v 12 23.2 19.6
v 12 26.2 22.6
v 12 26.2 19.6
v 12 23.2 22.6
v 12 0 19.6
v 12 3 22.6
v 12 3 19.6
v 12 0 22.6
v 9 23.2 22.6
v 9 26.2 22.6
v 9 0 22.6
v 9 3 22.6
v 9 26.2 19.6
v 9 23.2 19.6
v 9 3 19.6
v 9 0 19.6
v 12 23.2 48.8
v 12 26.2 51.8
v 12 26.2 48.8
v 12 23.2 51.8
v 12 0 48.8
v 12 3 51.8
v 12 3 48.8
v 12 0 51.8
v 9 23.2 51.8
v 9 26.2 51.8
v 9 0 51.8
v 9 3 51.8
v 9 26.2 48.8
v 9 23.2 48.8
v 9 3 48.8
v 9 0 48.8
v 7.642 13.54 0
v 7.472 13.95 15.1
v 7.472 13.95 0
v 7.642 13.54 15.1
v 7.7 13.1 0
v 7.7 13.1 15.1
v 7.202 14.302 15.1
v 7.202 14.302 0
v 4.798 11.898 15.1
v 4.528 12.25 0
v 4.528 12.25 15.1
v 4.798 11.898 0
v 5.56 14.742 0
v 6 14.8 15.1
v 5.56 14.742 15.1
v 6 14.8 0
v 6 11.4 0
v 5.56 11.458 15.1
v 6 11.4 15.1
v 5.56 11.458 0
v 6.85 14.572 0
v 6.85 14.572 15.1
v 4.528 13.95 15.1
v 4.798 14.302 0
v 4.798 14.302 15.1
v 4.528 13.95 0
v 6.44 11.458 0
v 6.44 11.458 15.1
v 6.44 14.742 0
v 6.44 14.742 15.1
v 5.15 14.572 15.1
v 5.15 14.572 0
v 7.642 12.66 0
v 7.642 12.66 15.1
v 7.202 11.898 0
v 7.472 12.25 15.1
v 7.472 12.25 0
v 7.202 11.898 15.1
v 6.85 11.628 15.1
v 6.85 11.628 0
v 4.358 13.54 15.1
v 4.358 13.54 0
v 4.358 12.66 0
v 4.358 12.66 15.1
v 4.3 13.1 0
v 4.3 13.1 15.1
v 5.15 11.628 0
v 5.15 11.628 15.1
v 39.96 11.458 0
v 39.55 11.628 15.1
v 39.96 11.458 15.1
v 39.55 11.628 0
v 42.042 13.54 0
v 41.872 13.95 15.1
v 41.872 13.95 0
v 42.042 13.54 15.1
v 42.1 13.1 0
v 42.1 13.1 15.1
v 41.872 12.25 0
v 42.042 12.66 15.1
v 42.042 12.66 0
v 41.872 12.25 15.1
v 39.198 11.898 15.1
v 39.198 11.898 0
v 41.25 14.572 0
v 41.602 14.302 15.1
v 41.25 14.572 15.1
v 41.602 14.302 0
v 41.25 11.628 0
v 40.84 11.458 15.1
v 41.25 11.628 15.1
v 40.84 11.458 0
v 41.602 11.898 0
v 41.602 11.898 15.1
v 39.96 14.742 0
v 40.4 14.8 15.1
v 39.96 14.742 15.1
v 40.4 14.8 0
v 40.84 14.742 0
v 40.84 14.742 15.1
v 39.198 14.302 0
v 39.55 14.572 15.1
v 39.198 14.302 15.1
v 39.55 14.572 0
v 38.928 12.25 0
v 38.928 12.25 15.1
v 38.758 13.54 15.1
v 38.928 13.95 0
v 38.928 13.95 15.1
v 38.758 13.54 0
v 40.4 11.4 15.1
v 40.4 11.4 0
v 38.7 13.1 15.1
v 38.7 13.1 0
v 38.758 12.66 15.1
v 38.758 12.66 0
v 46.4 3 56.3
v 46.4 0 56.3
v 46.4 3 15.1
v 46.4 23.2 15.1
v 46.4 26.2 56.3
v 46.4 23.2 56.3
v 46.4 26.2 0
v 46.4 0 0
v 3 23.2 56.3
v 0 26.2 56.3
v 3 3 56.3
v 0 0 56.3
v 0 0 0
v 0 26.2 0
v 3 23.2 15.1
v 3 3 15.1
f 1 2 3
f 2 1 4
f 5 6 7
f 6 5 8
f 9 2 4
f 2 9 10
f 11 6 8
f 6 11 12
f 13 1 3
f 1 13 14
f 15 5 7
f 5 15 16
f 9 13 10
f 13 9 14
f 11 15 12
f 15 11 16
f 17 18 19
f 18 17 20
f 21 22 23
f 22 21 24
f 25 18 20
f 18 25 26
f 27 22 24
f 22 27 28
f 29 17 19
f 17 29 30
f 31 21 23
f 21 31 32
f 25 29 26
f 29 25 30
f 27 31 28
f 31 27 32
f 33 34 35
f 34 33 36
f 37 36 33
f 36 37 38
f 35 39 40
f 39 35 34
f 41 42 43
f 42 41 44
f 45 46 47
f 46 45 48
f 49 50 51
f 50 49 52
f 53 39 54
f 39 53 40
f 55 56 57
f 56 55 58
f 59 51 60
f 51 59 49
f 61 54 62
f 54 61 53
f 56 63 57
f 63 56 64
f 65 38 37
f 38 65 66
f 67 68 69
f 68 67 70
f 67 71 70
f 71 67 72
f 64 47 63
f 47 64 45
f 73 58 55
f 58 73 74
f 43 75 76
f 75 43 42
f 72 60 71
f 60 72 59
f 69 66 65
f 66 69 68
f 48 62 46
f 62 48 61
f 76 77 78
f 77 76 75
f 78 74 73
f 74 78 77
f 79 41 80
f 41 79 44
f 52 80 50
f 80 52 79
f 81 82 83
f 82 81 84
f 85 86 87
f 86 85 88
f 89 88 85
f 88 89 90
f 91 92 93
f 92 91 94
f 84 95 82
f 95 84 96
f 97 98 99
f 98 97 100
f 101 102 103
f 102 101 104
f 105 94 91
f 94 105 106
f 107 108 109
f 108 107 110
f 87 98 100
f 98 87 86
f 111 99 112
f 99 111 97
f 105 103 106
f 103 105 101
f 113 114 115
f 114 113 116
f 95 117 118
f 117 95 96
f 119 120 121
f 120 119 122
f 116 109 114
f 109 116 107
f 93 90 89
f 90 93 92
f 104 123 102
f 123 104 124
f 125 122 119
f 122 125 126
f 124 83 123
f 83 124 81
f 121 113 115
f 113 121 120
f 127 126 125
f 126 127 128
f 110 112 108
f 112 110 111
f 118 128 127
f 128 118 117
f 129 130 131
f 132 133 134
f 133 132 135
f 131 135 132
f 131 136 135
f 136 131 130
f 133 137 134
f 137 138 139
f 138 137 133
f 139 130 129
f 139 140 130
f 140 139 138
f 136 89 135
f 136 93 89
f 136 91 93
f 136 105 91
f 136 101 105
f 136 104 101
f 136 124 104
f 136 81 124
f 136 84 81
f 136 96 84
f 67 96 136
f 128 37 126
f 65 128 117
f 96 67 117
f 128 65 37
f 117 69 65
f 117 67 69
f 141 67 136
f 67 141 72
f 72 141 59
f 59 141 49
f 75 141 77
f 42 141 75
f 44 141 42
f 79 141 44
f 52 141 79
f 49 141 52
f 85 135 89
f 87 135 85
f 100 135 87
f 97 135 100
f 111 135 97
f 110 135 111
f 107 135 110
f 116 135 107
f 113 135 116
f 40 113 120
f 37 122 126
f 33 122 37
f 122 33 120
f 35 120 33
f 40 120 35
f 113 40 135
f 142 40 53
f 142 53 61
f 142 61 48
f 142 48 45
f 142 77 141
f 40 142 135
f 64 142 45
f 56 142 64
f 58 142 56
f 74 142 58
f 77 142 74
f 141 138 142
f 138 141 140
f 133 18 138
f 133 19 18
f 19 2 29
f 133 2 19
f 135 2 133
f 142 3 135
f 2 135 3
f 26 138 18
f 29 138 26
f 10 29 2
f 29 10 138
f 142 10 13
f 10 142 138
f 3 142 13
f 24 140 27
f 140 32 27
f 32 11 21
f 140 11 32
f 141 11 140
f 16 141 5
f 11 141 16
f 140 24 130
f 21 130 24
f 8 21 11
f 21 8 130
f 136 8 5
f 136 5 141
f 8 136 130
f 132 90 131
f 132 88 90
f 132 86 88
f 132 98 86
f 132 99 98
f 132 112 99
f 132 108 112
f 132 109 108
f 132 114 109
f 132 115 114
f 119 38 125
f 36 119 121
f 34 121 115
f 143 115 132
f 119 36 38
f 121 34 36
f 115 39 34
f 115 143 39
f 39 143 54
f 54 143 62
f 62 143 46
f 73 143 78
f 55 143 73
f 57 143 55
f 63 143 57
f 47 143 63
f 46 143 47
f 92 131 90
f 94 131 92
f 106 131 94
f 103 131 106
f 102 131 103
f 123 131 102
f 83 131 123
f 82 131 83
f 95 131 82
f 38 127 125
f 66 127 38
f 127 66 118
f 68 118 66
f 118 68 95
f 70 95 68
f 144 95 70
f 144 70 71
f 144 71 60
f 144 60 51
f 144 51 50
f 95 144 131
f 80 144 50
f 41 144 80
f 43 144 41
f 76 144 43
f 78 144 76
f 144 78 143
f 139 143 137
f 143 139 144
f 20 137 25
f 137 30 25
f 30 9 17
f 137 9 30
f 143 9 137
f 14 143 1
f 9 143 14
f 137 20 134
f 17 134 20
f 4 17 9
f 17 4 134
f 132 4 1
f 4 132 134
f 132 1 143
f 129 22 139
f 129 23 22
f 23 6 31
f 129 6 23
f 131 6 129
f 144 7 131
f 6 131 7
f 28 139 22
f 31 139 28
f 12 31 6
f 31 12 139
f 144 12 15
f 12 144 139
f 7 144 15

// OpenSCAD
// file: params_v4.scad
// ============================================================
// params_v4.scad — print-in-place hinge, single continuous barrel
// Base + both flaps print together as ONE piece, flat/open (like
// the reference box), then fold closed by hand after printing.
// No rod, no pins, no hardware, no snap-assembly step.
// ============================================================
$fn = 64;

// ---- Bowl ----
BOWL_DIA      = 108;
BOWL_DEPTH    = 40;
BOWL_RADIUS   = BOWL_DIA / 2;

// ---- Base block ----
WALL          = 6;
FLOOR_T       = 4;
BASE_SIZE     = BOWL_DIA + 2 * WALL;     // 120mm square
BASE_HEIGHT   = BOWL_DEPTH + FLOOR_T;    // 44mm

// ---- Flap ----
FLAP_LEN      = BASE_SIZE;
FLAP_OVERLAP  = 4;
FLAP_DEPTH    = BASE_SIZE / 2 + FLAP_OVERLAP;
FLAP_T        = 3;

// ---- Print-in-place barrel hinge ----
PIN_D         = 8;                  // pin diameter
SOCKET_CLEAR  = 0.5;                // total diametral clearance (tune per printer/material)
SOCKET_ID     = PIN_D + SOCKET_CLEAR;
SOCKET_SHELL  = 3;
SOCKET_OD     = SOCKET_ID + 2 * SOCKET_SHELL;
END_MARGIN    = 4;                  // inset from each end of the edge
BARREL_LEN    = FLAP_LEN - 2 * END_MARGIN;   // socket length (both hinges)

// reinforcement ridge so the thin panel/base have enough material to embed the pin
PAD_DEPTH     = 10;
FLAP_PAD_H    = PIN_D + 2;
// HINGE_Z is set so the pin/socket genuinely overlaps into both the base
// block and the flap panel (a few mm of real volumetric overlap) rather
// than sitting exactly tangent to a flat face — exact tangency between
// separate solids is a classic non-manifold CSG trap.
HINGE_EMBED   = 2;  // how far the joint dips below the base's top surface
HINGE_Z       = BASE_HEIGHT + HINGE_EMBED;

// small relief gap so the flap panel doesn't touch the base along a bare
// edge (that kind of zero-area contact causes non-manifold CSG results,
// and physically the panel doesn't need to touch — only the pin/socket
// joint should connect the two pieces).
HINGE_GAP     = 0.4;
BASE_PAD_H    = (HINGE_Z - BASE_HEIGHT) + SOCKET_OD / 2 + 2;

// ---- Servo drive extension (flap's pin extends past the base to meet the horn) ----
SERVO_EXT_LEN = 22;                 // how far the pin extends past the base edge
SERVO_HORN_OD = 24;                 // verify with calipers
SERVO_HORN_BOLT_CIRCLE = 19;        // verify with calipers
SERVO_BOSS_D  = SERVO_HORN_OD + 4;
SERVO_BOSS_T  = 4;
M3_CLEAR      = 3.4;

// ---- MG996R servo body (for the separate bracket — still a physical part) ----
SERVO_W       = 40.7;
SERVO_D       = 19.7;
SERVO_H       = 42.9;
SERVO_SHAFT_OFFSET = 30.9;
// main file
// ============================================================
// 22_servo_mount_v2.scad — MG996R bracket, shaft aligned to rod
// The servo is rotated 90° from its usual orientation so the
// output shaft points sideways (along +X) into the rod/coupler,
// instead of the usual "shaft points up" mounting.
//
// Pocket is open on TOP (drop the servo in) and open on the
// FRONT/+X face (shaft + horn protrude toward the base). Servo
// is held with zip-tie slots rather than modeled ear-mount holes,
// since exact ear spacing varies by MG996R clone — verify yours
// with calipers; zip ties are forgiving of small errors for v1.
//
// Print orientation: as-is, flat on the bed.
// ============================================================
include <params_v4.scad>

WALL2   = 3;
TOL     = 0.5;   // pocket clearance around servo body

// after 90° remap: X-extent(depth into bracket)=SERVO_H, Y-extent=SERVO_D, Z-extent=SERVO_W
POCKET_X = SERVO_H + TOL;
POCKET_Y = SERVO_D + TOL;
POCKET_Z = SERVO_W + TOL;

// shaft sits 30.9mm up from the pocket's "bottom" (see params_v4 SERVO_SHAFT_OFFSET)
POCKET_BOTTOM_Z = HINGE_Z - SERVO_SHAFT_OFFSET;

BX = WALL2 + POCKET_X;              // back wall + pocket depth (front left open)
BY = POCKET_Y + 2 * WALL2;          // side walls both sides
BZ = POCKET_BOTTOM_Z + POCKET_Z;    // pedestal + pocket height (top left open)

module servo_pocket() {
    translate([WALL2, WALL2, POCKET_BOTTOM_Z])
        cube([POCKET_X + 5, POCKET_Y, POCKET_Z + 5]); // +5 extends through front & top (open)
}

module ziptie_slots() {
    // two slot pairs (through both side walls), one near pocket bottom, one near top
    for (z = [POCKET_BOTTOM_Z + 6, POCKET_BOTTOM_Z + POCKET_Z - 6]) {
        translate([WALL2 + 6, -1, z - 1.5])
            cube([3, BY + 2, 3]);
    }
}

module mount_holes() {
    // 2x M3 through the pedestal, for screwing bracket to a shared platform/board
    for (x = [6, BX - 6])
        translate([x, BY / 2, -0.1])
            cylinder(d = M3_CLEAR, h = POCKET_BOTTOM_Z + 0.2, $fn = 24);
}

module servo_bracket() {
    difference() {
        cube([BX, BY, BZ]);
        servo_pocket();
        ziptie_slots();
        mount_holes();
    }
}

servo_bracket();

// ---- reference: where the shaft/horn ends up in world coords (for the assembly) ----
echo("Servo shaft center (local bracket coords): X =", BX, " Y =", BY/2, " Z =", HINGE_Z);
